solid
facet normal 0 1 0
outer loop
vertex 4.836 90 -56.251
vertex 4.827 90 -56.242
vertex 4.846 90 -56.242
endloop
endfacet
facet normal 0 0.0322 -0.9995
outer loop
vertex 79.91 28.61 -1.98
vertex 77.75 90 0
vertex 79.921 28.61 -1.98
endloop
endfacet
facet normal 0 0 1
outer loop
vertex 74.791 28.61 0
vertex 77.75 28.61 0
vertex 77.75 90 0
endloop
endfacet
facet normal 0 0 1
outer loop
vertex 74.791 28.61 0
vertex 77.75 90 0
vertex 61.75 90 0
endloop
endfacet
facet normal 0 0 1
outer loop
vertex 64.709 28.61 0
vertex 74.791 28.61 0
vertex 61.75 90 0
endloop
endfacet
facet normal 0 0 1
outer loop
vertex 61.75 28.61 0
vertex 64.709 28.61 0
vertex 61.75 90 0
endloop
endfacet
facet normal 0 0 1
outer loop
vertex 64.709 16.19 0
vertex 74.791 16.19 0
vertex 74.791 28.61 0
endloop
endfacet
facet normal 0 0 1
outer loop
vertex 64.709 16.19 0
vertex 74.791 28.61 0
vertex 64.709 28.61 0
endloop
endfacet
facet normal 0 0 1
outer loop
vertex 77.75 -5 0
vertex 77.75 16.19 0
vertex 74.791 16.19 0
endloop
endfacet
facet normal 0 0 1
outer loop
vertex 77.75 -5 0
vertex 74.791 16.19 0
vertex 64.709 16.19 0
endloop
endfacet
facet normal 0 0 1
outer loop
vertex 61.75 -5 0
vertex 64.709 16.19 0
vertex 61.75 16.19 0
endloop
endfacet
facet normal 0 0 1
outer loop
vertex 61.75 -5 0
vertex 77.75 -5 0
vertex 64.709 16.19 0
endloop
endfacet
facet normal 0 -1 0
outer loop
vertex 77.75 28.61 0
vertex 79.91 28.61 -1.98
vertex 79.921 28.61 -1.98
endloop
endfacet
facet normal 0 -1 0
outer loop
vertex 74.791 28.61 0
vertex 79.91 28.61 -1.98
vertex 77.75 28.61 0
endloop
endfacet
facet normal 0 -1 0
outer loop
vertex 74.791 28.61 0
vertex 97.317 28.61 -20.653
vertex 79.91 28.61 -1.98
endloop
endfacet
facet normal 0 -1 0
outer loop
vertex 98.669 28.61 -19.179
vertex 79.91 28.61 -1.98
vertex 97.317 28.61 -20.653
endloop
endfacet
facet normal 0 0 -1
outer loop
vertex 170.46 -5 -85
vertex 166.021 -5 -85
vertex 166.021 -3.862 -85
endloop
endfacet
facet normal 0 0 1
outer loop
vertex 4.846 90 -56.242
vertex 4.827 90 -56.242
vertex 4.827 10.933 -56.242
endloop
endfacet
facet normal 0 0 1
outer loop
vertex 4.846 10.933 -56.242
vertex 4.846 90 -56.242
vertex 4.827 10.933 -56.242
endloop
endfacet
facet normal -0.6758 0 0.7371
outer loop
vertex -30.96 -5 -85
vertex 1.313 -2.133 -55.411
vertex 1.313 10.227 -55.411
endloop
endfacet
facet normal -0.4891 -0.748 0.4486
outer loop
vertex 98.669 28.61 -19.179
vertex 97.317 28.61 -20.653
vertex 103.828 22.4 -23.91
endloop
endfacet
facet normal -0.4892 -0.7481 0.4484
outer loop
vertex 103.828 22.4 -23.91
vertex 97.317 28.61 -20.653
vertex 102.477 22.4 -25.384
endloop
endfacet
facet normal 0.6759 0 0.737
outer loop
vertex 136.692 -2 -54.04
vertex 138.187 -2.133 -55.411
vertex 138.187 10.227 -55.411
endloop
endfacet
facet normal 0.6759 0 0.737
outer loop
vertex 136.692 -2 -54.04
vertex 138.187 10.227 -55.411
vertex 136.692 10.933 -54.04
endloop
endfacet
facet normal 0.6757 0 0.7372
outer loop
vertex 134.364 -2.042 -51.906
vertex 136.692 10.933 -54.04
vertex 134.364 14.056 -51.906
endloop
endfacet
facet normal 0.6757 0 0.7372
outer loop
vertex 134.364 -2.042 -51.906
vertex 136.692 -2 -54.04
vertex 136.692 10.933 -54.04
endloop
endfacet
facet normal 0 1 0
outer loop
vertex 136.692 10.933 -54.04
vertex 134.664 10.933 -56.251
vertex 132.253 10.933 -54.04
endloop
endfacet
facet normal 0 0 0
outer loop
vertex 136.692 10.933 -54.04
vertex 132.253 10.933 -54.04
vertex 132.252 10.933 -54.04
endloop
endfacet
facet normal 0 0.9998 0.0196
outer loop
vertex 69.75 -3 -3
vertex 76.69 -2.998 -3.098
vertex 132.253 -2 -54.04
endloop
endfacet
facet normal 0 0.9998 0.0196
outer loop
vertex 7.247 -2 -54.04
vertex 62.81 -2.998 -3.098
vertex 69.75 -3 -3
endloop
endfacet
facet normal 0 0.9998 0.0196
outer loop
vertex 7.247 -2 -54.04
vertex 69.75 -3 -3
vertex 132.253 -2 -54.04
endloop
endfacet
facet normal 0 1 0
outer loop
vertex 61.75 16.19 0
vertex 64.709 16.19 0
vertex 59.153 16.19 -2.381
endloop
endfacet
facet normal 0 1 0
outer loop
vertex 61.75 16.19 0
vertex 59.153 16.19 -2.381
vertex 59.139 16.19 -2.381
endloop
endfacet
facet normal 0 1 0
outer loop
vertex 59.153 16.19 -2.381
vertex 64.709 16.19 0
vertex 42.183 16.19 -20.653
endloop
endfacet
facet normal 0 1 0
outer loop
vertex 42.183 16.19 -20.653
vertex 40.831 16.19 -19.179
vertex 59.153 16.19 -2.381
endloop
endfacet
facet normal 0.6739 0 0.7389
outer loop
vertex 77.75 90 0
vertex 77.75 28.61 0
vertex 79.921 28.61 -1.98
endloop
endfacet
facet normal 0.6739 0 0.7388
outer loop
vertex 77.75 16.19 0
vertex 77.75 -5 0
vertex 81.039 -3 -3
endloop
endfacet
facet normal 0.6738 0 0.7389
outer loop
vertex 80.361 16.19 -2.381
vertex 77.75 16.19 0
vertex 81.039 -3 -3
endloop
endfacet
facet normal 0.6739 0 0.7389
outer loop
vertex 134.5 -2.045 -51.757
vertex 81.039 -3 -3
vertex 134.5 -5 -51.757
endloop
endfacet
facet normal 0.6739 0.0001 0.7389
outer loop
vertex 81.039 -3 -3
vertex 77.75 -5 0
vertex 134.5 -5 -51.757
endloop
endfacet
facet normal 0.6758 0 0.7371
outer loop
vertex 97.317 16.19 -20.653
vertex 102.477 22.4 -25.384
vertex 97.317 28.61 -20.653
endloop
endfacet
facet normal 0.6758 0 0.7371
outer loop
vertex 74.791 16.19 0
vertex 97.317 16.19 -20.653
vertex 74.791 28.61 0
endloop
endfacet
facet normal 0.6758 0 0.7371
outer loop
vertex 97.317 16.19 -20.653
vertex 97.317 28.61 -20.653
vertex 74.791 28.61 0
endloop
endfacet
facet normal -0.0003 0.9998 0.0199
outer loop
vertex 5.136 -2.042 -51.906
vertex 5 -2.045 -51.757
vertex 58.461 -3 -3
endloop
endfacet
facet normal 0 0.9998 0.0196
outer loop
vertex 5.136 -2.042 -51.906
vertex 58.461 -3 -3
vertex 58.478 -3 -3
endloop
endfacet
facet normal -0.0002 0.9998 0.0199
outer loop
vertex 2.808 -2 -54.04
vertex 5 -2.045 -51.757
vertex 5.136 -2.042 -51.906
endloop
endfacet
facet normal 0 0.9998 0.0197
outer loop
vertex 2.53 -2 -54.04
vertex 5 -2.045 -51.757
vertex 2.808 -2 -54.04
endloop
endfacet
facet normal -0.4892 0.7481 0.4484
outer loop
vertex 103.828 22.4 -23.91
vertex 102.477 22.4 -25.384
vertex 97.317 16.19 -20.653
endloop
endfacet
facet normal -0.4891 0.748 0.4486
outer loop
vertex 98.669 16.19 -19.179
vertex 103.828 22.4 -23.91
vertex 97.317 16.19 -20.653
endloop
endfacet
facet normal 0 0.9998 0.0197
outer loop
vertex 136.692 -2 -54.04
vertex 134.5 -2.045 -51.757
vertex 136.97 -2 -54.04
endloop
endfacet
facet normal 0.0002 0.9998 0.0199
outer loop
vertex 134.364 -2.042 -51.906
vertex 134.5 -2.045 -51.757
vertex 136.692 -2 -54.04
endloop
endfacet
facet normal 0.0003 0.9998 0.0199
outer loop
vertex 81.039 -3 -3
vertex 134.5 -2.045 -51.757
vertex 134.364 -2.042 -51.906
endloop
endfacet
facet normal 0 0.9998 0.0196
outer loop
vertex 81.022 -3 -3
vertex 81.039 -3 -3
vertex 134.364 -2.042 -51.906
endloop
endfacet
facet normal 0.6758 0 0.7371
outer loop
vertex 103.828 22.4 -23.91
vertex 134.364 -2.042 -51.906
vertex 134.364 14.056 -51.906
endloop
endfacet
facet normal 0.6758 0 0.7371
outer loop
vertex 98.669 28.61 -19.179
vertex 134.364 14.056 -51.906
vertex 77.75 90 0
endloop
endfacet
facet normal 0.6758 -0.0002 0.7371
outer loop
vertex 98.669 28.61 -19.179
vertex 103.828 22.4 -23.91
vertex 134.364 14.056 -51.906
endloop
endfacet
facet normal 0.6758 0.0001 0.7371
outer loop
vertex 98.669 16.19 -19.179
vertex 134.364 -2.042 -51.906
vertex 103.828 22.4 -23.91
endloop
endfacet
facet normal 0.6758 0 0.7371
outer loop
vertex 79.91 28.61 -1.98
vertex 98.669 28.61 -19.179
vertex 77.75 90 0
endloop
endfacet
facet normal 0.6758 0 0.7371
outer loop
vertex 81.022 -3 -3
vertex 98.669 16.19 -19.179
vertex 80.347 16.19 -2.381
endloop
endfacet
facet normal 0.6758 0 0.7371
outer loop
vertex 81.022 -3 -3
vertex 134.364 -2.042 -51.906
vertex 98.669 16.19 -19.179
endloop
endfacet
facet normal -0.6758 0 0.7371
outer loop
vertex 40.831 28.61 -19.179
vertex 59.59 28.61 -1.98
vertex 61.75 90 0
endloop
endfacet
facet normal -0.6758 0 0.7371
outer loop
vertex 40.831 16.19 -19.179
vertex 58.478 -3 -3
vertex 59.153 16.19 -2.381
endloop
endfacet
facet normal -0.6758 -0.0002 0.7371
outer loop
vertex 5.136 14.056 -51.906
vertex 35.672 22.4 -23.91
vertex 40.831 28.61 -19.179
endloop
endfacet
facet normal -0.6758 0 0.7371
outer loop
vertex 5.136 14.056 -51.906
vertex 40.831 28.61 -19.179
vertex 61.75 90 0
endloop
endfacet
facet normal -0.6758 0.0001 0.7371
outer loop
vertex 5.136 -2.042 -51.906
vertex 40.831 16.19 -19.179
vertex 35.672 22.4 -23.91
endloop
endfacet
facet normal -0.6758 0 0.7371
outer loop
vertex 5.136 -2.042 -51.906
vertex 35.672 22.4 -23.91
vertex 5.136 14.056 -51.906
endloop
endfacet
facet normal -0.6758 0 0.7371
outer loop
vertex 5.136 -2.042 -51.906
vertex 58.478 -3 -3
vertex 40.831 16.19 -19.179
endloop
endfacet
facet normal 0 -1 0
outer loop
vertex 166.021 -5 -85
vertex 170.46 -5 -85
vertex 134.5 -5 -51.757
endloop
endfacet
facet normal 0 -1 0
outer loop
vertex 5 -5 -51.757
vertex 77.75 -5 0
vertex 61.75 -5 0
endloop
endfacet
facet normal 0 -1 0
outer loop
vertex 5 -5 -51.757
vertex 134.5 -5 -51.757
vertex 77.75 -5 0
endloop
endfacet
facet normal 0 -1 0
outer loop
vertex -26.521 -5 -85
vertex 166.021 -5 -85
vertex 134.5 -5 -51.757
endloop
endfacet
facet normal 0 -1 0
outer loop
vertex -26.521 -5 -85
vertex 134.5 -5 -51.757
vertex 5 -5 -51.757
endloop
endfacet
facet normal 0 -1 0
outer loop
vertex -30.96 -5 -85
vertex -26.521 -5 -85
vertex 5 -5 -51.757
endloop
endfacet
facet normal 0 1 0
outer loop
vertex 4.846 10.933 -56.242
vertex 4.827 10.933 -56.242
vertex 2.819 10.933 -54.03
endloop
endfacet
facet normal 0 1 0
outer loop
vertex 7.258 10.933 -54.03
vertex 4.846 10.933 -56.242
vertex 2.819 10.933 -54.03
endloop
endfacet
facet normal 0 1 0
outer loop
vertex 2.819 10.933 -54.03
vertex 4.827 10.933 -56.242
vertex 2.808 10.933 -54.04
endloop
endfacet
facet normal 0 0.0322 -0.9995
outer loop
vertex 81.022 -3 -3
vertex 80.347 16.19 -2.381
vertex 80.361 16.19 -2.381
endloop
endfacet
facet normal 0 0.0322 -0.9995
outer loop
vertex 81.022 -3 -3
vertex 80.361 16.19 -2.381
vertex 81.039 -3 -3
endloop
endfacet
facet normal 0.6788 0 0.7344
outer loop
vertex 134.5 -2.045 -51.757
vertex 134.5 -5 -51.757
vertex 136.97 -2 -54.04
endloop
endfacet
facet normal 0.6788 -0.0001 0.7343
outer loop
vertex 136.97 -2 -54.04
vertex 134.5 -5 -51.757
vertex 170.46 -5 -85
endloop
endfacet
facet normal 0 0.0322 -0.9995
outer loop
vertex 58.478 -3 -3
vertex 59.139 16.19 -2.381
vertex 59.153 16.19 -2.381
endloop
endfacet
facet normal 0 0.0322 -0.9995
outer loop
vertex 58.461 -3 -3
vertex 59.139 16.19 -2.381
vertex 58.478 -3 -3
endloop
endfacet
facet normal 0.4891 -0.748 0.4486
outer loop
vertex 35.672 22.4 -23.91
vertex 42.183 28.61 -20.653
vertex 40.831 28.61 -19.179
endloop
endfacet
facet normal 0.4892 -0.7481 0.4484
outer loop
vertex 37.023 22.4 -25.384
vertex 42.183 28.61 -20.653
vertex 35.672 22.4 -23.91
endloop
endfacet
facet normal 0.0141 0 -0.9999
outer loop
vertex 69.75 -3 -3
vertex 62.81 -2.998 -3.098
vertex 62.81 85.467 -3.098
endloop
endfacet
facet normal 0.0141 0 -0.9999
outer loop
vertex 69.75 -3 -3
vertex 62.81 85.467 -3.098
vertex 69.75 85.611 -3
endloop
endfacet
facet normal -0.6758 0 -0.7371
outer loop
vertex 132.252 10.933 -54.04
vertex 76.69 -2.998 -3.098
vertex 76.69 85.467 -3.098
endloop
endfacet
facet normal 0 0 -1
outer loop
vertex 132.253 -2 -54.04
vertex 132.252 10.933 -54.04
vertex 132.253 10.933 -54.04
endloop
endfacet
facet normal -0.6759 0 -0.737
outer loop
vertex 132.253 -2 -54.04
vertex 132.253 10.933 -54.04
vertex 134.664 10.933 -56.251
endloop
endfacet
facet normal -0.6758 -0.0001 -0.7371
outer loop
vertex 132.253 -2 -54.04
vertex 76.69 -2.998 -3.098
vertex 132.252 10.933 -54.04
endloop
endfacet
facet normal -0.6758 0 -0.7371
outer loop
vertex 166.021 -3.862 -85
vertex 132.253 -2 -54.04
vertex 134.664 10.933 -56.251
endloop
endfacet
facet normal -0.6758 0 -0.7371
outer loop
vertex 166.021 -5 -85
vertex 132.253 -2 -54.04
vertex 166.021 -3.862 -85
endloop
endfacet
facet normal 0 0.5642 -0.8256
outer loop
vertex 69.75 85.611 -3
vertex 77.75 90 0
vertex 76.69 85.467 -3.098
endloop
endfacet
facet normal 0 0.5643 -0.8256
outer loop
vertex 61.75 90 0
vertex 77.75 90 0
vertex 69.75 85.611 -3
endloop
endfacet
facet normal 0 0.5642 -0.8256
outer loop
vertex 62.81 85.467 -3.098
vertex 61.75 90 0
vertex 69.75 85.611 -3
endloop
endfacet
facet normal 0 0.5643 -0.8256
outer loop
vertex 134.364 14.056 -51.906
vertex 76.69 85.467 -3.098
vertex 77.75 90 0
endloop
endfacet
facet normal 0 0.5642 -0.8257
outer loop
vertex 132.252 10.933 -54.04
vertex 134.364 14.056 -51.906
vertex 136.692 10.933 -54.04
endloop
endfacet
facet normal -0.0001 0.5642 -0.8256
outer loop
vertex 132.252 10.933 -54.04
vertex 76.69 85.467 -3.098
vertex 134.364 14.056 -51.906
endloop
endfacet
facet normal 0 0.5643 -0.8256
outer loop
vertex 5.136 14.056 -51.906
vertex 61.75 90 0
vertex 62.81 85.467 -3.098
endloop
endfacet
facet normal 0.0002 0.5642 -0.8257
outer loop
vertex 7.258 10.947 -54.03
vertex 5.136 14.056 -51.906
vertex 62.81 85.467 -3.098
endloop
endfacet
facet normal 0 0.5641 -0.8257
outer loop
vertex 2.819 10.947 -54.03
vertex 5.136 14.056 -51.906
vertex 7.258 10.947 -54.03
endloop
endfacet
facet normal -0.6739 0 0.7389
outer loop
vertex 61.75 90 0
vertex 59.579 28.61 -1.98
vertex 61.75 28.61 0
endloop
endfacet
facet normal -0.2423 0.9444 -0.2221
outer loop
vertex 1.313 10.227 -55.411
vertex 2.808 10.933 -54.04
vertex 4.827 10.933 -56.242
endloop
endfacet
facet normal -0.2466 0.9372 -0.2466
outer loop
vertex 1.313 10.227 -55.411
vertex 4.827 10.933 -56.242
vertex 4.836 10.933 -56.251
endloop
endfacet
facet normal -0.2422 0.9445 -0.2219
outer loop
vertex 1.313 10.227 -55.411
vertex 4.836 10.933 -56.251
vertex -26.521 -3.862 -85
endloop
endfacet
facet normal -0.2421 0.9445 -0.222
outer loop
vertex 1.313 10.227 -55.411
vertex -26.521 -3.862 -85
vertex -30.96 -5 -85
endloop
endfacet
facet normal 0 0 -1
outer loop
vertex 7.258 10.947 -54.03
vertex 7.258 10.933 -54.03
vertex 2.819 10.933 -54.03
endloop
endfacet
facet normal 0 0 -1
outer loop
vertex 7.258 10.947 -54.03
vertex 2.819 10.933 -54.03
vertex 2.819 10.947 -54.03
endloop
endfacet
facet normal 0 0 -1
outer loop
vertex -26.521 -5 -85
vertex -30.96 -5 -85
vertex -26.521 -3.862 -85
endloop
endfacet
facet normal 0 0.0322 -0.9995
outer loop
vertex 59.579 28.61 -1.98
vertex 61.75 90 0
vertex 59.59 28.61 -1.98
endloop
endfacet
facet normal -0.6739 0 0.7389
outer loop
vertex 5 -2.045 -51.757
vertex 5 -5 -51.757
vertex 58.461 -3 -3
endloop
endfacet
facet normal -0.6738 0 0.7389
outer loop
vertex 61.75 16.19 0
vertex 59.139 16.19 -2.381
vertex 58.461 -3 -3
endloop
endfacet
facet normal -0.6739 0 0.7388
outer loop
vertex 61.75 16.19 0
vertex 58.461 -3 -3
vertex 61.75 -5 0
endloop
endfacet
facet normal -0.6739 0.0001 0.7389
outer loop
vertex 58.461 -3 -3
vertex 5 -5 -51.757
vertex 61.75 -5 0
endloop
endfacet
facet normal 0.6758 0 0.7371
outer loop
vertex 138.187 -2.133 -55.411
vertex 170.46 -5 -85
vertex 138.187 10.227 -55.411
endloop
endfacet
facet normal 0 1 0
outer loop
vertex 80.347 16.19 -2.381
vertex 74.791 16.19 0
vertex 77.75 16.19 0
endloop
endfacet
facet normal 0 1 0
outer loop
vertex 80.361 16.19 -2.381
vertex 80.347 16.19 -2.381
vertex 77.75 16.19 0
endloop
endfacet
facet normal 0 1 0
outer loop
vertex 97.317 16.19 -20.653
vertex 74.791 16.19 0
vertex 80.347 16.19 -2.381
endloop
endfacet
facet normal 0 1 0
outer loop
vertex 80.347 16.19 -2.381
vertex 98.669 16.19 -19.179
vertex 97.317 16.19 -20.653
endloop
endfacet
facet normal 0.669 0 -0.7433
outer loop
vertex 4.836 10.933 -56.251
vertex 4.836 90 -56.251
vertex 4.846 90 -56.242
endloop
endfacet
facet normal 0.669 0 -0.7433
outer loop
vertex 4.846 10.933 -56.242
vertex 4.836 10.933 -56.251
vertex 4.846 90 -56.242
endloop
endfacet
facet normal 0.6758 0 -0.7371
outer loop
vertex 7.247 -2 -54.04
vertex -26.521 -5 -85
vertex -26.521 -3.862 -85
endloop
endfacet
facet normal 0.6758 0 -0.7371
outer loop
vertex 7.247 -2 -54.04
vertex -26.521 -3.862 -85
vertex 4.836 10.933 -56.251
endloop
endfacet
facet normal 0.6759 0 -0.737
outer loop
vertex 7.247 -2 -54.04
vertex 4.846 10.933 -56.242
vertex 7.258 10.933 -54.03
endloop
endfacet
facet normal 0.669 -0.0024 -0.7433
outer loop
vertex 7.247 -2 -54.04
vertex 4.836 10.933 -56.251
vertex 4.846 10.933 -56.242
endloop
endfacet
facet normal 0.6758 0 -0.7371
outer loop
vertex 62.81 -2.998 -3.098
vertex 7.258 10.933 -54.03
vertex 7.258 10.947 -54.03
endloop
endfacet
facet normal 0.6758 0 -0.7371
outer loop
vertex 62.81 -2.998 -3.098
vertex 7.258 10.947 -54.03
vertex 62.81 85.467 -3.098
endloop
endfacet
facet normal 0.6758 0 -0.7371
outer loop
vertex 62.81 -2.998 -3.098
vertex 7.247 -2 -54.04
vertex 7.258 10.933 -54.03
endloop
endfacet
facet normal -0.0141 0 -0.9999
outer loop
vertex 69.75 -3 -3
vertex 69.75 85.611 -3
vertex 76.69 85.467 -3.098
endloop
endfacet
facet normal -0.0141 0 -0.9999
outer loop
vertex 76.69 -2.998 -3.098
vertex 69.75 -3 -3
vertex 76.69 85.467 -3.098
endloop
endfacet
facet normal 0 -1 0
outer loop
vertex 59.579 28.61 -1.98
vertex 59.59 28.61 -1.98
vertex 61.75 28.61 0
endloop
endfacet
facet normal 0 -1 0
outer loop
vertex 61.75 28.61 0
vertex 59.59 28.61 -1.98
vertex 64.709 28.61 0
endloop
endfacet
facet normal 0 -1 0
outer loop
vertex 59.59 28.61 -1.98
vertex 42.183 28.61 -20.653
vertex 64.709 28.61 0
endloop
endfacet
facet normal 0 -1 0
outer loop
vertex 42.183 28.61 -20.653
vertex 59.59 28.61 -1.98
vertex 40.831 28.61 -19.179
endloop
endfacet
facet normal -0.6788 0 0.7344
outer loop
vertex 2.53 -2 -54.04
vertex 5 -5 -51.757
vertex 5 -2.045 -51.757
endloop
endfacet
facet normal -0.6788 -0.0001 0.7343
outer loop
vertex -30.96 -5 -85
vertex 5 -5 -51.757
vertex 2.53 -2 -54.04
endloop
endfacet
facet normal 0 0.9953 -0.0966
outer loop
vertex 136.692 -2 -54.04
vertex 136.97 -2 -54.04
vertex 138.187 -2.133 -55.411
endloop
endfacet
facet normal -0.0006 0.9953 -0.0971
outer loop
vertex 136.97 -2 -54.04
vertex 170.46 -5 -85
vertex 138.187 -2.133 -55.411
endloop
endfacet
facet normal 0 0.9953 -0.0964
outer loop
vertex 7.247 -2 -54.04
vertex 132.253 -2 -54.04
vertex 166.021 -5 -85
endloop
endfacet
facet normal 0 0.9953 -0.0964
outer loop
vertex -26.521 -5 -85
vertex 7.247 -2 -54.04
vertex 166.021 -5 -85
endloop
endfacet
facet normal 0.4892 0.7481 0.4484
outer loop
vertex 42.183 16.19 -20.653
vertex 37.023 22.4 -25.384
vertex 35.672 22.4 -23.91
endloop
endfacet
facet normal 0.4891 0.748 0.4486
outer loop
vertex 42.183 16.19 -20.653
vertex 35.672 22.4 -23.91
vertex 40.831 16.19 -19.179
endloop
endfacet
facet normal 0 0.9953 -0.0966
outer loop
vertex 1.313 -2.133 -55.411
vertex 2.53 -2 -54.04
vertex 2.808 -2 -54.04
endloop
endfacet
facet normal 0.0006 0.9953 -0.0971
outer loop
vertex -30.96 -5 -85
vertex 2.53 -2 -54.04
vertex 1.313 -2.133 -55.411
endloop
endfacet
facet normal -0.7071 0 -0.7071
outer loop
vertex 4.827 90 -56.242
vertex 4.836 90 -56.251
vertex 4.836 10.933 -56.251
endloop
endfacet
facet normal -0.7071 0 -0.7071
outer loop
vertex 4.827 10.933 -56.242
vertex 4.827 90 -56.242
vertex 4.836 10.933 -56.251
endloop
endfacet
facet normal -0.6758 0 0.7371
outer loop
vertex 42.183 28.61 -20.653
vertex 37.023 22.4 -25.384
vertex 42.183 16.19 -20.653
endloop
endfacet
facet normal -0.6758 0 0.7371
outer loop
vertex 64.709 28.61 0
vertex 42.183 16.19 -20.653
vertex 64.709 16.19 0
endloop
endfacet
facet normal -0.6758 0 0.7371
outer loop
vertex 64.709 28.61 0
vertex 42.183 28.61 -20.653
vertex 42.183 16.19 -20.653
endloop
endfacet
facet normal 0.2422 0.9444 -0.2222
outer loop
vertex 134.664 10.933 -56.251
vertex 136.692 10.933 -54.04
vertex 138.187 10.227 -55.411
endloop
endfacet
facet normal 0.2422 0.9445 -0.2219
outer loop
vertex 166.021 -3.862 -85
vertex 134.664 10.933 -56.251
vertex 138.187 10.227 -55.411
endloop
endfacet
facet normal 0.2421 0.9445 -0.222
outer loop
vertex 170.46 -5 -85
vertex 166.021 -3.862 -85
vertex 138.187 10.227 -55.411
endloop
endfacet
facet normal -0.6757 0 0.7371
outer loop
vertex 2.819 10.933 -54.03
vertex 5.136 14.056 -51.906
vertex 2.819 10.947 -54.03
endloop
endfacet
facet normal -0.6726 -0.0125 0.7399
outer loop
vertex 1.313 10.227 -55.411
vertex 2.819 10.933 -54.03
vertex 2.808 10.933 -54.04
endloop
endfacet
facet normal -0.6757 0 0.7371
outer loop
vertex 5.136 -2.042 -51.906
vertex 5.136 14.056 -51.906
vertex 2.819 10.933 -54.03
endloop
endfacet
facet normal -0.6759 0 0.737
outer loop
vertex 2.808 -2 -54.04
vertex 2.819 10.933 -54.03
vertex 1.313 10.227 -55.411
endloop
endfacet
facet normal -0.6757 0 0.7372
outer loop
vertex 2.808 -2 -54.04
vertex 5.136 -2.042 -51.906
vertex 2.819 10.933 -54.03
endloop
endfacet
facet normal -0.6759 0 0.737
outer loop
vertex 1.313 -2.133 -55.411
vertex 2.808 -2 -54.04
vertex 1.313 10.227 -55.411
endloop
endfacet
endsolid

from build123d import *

# Parameters (mm, degrees)
BOSS_EXTRUDE3_START      = -5
BOSS_EXTRUDE3_DEPTH      = 95
CUT_EXTRUDE1_DEPTH       = 211.669436796
CUT_EXTRUDE1_DEPTH_BACK  = 211.669436796
BOSS_EXTRUDE10_DEPTH     = 95
CUT_EXTRUDE2_DEPTH       = 211.669436796
CUT_EXTRUDE2_DEPTH_BACK  = 211.669436796
CUT_EXTRUDE7_DEPTH       = 211.669436796
CUT_EXTRUDE7_DEPTH_BACK  = 211.669436796
CUT_EXTRUDE12_START      = -3
CUT_EXTRUDE12_DEPTH      = 3
CUT_EXTRUDE18_DEPTH      = 263.682253196
CUT_EXTRUDE18_DEPTH_BACK = 263.682253196
CUT_EXTRUDE23_START      = -2
SKETCH26_W               = 5.160164367
SKETCH26_H               = 12.42
CUT_EXTRUDE23_DEPTH      = 207.011897718


# Read off the part's stored shape, not the designer's step: Cut-Extrude12
with BuildPart() as part:
    # Sketch4 → Boss-Extrude3 (new body)
    with BuildSketch(Plane(origin=(0, 0, 0), x_dir=(1, 0, 0), z_dir=(0, 1, 0)).offset(BOSS_EXTRUDE3_START)):
        Polygon((0, 54.04), (-30.96, 85), (170.46, 85), (139.5, 54.04), (139.5, 0), (0, 0), align=None)
    extrude(amount=BOSS_EXTRUDE3_DEPTH)

    # Sketch5 → Cut-Extrude1 (cut, two sides: drawn at the far end of the back side and taken through both)
    with BuildSketch(Plane(origin=(139.5, 0, 0), x_dir=(0, 0, -1), z_dir=(1, 0, 0)).offset(-CUT_EXTRUDE1_DEPTH_BACK)):
        Polygon((0, 90), (3, -3), (54.04, -2), (85, -5), (85, 90), align=None)
    extrude(amount=CUT_EXTRUDE1_DEPTH + CUT_EXTRUDE1_DEPTH_BACK, mode=Mode.SUBTRACT)

    # Sketch12 → Boss-Extrude10 (add)
    with BuildSketch(Plane.XZ.offset(5)):
        Polygon((77.75, 0), (61.75, 0), (5.136208879, -51.905643893), (1.313057643, -55.410852123), (-30.96, -85), (-26.520771025, -85), (62.809775082, -3.09840989), (69.75, -3), (76.690224918, -3.09840989), (166.020771025, -85), (170.46, -85), (138.186942357, -55.410852123), (134.363791121, -51.905643893), align=None)
    extrude(amount=-BOSS_EXTRUDE10_DEPTH)

    # Sketch6 → Cut-Extrude2 (cut, two sides: drawn at the far end of the back side and taken through both)
    with BuildSketch(Plane(origin=(139.5, 0, 0), x_dir=(0, 0, -1), z_dir=(1, 0, 0)).offset(-CUT_EXTRUDE2_DEPTH_BACK)):
        Polygon((54.04, 90), (0, 90), (54.04, 10.932684034), align=None)
    extrude(amount=CUT_EXTRUDE2_DEPTH + CUT_EXTRUDE2_DEPTH_BACK, mode=Mode.SUBTRACT)

    # Sketch18 → Cut-Extrude7 (cut, two sides: drawn at the far end of the back side and taken through both)
    with BuildSketch(Plane(origin=(0, 0, 0), x_dir=(1, 0, 0), z_dir=(0, 1, 0)).offset(-CUT_EXTRUDE7_DEPTH_BACK)):
        Polygon((-30.96, 85), (-32.039877687, 0), (5, 0), (5, 51.757080067), align=None)
        Polygon((61.75, 0), (5, 0), (5, 51.757080067), align=None)
        Polygon((134.5, 0), (77.75, 0), (134.5, 51.757080067), align=None)
        Polygon((170.46, 0), (134.5, 0), (134.5, 51.757080067), (170.46, 85), align=None)
    extrude(amount=CUT_EXTRUDE7_DEPTH + CUT_EXTRUDE7_DEPTH_BACK, mode=Mode.SUBTRACT)

    # Cut-Extrude12 outline → Cut-Extrude12 (cut)
    with BuildSketch(Plane(origin=(37.313647502, 0, 37.073562316), x_dir=(0.7370914330343759, 0, -0.6757930299635608), z_dir=(0.6757930299635608, 0, 0.7370914330343759)).offset(CUT_EXTRUDE12_START)):
        Polygon((134.824655296, 90), (134.824655296, 10.932684034), (180.637498322, -5), (180.637498322, 90), align=None)
    cut_extrude12 = extrude(amount=CUT_EXTRUDE12_DEPTH, mode=Mode.SUBTRACT)

    # Sketch24 → Cut-Extrude18 (cut, two sides: drawn at the far end of the back side and taken through both)
    with BuildSketch(Plane(origin=(-45.105018851, -43.594474596, -16.544137217), x_dir=(-6.841846231332114e-05, 0.3790169981348638, -0.9253897073361853), z_dir=(0.999999997266826, 0, -7.393475590237281e-05)).offset(-CUT_EXTRUDE18_DEPTH_BACK)):
        Polygon((55.352567213, 36.252396593), (85.320423961, 109.420477175), (87.366853148, 108.582309818), (57.398996399, 35.414229236), align=None)
    extrude(amount=CUT_EXTRUDE18_DEPTH + CUT_EXTRUDE18_DEPTH_BACK, mode=Mode.SUBTRACT)

    # Mirror4: Cut-Extrude12 across plane
    add(cut_extrude12.mirror(Plane(origin=(69.75, 0, 0), x_dir=(0, 0, 1), z_dir=(1, 0, 0))), mode=Mode.SUBTRACT)

    # Sketch26 → Cut-Extrude23 (cut)
    with BuildSketch(Plane(origin=(35.508131054, 0, 38.728927412), x_dir=(0.7370914330343759, 0, -0.6757930299635608), z_dir=(0.6757930299635608, 0, 0.7370914330343759)).offset(CUT_EXTRUDE23_START)):
        Polygon((67.688858918, 28.61), (85.688858918, 28.61), (92.688858918, 22.4), (85.688858918, 16.19), (67.688858918, 16.19), align=None)
        with Locations((54.728776735, 22.4)):
            Rectangle(SKETCH26_W, SKETCH26_H)
        Polygon((67.688858918, 16.19), (67.688858918, 28.61), (60.239227379, 28.61), (60.832079248, 16.19), align=None)
        Polygon((60.832079248, 16.19), (60.239227379, 28.61), (57.308858918, 28.61), (57.308858918, 16.19), align=None)
    cut_extrude23 = extrude(amount=CUT_EXTRUDE23_DEPTH, mode=Mode.SUBTRACT)

    # Mirror5: Cut-Extrude23 across plane
    add(cut_extrude23.mirror(Plane(origin=(69.75, 0, 0), x_dir=(0, 0, 1), z_dir=(1, 0, 0))), mode=Mode.SUBTRACT)


solid = part.part
